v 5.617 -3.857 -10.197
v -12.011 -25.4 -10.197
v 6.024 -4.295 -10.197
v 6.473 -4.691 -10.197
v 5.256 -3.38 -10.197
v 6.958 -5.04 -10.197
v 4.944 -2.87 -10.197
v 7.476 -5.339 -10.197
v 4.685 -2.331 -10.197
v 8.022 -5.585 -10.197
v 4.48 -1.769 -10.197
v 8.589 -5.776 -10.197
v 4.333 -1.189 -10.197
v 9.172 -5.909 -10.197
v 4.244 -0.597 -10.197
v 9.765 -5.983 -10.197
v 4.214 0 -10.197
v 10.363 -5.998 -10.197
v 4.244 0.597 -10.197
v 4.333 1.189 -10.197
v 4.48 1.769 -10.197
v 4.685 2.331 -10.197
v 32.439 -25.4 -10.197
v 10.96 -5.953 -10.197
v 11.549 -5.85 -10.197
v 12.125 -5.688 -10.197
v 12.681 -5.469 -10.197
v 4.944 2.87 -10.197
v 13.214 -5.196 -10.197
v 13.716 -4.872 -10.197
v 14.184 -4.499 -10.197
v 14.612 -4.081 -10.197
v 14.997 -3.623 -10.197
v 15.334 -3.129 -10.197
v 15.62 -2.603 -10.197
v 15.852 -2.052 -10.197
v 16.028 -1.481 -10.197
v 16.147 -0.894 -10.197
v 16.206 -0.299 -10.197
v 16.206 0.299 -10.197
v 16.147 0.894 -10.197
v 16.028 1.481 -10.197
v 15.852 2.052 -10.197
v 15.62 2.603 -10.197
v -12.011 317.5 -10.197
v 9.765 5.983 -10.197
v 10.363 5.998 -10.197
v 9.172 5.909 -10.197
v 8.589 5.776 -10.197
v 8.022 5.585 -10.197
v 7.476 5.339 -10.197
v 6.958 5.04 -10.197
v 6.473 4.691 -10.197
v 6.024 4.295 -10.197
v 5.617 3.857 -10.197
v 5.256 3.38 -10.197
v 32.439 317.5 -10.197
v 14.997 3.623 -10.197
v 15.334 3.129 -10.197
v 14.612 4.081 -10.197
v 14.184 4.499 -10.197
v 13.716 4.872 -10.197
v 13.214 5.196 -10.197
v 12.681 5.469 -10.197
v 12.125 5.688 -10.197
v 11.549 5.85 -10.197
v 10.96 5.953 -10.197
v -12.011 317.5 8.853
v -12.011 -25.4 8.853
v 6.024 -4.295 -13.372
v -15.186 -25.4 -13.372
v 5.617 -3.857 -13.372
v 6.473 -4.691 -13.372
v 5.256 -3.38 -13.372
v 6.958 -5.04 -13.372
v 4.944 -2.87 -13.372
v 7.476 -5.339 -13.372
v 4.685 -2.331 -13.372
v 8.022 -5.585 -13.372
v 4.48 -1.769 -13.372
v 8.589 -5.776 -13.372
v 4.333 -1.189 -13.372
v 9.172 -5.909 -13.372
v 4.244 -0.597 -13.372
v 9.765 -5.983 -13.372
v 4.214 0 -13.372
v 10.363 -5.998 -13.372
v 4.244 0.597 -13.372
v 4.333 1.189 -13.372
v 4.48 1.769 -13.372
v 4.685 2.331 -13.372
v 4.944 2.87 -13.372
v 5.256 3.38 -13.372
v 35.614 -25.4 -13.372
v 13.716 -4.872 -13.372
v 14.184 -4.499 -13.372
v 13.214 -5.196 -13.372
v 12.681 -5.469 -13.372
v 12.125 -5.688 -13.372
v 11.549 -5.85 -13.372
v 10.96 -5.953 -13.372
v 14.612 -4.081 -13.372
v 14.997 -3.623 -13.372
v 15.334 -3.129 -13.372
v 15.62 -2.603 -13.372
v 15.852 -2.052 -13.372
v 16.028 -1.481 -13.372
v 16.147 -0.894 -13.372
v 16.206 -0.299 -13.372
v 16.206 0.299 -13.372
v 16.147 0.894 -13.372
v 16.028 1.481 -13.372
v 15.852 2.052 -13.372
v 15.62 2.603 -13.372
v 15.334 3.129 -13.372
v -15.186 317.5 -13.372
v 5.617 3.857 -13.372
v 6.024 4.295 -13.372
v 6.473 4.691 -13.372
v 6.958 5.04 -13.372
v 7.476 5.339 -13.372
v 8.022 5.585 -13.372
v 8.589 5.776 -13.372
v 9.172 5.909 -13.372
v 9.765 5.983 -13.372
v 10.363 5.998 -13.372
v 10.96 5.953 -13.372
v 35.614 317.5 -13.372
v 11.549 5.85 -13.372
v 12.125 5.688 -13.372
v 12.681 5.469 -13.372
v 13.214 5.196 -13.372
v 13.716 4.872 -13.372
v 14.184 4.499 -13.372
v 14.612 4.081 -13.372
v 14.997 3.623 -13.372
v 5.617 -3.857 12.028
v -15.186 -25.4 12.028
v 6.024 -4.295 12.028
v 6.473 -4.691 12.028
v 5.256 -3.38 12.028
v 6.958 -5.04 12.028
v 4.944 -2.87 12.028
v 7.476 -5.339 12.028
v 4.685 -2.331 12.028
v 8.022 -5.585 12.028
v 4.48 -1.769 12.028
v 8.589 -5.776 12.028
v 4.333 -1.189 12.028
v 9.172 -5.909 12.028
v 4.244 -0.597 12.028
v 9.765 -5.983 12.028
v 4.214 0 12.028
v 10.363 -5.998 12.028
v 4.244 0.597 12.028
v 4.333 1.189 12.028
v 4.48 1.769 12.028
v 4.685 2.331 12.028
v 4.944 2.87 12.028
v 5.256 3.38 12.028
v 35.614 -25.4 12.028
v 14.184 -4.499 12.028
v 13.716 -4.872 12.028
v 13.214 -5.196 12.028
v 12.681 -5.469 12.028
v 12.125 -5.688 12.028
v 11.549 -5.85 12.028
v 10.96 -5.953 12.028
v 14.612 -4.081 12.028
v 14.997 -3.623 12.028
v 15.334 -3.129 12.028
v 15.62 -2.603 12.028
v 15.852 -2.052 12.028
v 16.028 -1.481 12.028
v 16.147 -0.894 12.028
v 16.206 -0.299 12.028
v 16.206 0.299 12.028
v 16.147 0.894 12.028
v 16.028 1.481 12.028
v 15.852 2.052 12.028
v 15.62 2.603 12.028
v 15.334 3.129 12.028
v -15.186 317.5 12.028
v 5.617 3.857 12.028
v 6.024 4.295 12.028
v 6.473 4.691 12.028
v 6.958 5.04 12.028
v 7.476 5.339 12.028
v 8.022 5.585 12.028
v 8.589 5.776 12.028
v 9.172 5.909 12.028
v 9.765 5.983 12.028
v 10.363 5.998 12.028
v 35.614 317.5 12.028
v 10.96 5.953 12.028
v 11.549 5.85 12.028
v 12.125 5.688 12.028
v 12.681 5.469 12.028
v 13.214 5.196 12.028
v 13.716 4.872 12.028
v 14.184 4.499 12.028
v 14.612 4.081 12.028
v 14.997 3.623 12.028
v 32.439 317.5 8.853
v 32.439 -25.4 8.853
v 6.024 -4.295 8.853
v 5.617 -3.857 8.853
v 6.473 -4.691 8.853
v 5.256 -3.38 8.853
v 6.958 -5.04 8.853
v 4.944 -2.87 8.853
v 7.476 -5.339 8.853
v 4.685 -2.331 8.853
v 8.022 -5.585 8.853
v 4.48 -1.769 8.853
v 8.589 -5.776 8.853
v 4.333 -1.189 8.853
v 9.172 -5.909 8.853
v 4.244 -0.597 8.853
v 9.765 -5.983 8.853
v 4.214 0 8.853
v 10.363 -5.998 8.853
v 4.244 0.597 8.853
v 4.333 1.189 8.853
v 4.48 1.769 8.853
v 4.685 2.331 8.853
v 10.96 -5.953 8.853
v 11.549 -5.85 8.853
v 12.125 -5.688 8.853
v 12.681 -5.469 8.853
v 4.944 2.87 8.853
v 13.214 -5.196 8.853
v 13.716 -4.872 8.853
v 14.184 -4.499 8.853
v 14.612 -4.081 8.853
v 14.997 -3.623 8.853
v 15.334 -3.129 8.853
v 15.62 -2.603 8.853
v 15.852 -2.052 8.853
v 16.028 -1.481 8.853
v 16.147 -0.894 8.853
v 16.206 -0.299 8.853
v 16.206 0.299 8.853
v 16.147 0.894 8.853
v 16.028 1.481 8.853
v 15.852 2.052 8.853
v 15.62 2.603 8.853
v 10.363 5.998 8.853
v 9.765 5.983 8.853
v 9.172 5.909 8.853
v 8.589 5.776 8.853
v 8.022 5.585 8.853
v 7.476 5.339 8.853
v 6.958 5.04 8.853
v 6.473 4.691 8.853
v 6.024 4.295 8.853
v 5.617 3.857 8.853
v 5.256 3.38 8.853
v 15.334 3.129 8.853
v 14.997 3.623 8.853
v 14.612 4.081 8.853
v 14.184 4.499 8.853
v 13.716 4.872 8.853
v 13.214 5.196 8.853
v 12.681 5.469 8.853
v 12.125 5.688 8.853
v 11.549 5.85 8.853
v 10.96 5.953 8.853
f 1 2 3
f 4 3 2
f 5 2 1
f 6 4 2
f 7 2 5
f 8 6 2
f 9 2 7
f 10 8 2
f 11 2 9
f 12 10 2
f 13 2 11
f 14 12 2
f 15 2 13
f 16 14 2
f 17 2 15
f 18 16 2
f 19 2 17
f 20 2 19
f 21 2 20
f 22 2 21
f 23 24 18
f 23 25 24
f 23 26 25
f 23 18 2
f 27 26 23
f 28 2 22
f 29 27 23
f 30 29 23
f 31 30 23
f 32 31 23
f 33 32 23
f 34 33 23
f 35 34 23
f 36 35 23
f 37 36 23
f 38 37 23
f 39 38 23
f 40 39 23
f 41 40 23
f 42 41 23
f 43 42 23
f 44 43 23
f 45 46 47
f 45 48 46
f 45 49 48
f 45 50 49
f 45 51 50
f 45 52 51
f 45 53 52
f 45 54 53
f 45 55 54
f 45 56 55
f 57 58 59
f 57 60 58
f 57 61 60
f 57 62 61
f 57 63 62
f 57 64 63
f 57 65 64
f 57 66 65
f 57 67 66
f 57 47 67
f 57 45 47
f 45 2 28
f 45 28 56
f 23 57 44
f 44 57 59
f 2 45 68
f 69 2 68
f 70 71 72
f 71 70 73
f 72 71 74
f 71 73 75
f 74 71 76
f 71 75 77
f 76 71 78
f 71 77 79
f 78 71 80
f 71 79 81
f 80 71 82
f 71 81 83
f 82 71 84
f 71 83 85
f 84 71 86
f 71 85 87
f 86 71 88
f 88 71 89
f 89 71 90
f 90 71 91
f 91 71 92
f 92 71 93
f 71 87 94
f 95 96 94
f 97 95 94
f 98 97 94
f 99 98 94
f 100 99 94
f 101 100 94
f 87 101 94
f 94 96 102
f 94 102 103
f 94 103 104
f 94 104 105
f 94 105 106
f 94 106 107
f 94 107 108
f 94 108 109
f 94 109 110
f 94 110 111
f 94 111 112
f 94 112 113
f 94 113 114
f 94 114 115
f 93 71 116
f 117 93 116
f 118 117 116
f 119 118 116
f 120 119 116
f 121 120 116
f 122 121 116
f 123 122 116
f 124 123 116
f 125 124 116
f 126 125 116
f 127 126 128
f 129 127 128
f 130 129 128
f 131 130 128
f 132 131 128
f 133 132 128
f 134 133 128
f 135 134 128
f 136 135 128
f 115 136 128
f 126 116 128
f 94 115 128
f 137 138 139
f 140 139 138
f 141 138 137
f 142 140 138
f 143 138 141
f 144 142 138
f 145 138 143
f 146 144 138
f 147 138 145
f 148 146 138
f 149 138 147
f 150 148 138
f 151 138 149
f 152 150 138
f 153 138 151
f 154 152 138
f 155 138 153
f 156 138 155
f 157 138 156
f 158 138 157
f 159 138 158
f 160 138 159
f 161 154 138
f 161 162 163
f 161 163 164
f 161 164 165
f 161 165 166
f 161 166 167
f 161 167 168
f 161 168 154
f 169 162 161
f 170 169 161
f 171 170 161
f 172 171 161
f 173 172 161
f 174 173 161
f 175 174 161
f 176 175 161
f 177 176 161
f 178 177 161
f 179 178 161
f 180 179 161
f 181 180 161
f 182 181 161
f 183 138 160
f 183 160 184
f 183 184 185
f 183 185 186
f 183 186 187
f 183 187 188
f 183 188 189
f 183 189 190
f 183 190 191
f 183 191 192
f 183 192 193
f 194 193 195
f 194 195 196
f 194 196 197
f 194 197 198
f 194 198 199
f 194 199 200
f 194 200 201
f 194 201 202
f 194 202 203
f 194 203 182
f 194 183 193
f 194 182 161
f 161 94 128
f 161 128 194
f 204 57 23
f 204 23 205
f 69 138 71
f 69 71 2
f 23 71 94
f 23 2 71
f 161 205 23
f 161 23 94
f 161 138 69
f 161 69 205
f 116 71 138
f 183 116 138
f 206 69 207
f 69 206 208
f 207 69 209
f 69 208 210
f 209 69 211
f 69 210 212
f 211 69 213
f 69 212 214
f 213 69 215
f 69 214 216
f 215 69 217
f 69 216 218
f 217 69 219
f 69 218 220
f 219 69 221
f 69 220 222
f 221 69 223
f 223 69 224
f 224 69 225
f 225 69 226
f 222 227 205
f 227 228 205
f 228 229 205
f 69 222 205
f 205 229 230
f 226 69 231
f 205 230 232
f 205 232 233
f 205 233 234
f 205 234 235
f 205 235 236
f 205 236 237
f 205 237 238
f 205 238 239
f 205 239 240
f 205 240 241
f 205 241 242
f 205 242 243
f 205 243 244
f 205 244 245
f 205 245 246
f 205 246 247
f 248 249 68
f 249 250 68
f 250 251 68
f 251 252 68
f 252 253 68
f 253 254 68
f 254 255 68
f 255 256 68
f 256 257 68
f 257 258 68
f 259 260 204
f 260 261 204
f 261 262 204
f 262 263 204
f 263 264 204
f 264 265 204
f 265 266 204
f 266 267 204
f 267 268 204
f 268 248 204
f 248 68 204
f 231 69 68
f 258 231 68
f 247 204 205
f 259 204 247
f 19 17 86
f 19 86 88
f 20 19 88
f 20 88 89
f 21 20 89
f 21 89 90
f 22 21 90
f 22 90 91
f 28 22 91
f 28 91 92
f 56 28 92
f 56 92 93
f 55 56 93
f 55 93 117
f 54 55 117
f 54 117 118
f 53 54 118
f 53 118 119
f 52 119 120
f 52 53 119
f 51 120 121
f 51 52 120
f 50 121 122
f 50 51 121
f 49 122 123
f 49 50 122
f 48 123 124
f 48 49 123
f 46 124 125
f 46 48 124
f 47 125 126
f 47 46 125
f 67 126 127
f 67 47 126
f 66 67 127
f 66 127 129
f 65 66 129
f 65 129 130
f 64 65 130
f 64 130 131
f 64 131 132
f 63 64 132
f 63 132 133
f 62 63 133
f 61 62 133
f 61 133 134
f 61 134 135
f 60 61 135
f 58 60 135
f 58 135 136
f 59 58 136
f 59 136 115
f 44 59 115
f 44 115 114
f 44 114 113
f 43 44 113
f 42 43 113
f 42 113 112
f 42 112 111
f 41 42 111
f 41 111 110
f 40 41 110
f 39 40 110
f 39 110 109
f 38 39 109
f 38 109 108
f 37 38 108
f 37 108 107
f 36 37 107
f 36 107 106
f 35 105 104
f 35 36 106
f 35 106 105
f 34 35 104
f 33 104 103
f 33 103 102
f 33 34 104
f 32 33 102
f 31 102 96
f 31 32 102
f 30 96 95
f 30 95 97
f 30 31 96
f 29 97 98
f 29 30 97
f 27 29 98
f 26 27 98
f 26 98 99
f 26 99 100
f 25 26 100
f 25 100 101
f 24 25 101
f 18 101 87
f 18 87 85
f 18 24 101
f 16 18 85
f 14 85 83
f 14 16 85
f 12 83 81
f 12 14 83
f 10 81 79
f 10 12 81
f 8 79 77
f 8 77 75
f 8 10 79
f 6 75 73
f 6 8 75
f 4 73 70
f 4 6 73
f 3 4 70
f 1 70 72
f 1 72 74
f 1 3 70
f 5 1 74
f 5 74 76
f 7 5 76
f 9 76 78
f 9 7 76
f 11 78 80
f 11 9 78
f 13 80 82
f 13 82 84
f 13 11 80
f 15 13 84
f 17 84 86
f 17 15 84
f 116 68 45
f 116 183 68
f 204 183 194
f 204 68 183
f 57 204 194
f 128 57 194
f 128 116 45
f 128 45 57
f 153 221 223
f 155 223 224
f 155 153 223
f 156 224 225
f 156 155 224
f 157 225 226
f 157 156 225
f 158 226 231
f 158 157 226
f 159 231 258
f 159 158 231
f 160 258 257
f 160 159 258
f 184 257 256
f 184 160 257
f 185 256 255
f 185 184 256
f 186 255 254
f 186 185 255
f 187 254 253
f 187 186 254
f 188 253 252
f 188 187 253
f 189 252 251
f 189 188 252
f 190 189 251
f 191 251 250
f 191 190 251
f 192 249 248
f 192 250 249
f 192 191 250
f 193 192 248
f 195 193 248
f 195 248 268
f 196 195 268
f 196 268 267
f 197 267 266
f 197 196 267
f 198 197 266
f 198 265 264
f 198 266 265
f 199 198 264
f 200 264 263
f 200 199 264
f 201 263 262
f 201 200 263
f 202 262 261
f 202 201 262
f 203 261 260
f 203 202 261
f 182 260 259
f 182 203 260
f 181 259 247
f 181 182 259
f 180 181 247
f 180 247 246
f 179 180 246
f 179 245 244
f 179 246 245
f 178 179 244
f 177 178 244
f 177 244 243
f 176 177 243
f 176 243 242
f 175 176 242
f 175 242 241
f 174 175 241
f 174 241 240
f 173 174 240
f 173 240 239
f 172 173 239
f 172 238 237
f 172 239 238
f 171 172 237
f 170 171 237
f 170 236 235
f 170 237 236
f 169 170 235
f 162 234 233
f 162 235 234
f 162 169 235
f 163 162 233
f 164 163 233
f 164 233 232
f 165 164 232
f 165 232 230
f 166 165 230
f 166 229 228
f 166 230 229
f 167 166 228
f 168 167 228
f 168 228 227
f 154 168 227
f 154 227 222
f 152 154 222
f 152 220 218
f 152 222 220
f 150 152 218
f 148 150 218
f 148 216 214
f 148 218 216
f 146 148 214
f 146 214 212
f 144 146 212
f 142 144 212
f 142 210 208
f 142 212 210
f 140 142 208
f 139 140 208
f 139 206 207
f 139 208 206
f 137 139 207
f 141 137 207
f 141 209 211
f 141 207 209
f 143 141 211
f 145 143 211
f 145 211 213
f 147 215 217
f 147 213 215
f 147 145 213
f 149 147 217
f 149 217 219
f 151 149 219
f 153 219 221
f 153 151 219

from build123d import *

# Parameters (mm, degrees)
SKETCH2_W            = 50.8
SKETCH2_H            = 25.4
SKETCH2_W_2          = 44.45
SKETCH2_H_2          = 19.05
EXTRUDE_THIN1_DEPTH  = 355.6
SKETCH25_W           = 50.8
SKETCH25_H           = 25.4
SKETCH25_W_2         = 44.45
SKETCH25_H_2         = 19.05
BOSS_EXTRUDE14_DEPTH = 25.4
CUT_EXTRUDE9_START   = -25.4
SKETCH28_R           = 6
CUT_EXTRUDE9_DEPTH   = 25.4
SKETCH30_W           = 50.8
SKETCH30_H           = 25.4
CUT_EXTRUDE11_DEPTH  = 38.1


with BuildPart() as part:
    # Sketch2 → Extrude-Thin1 (new body)
    with BuildSketch(Plane(origin=(0, 0, 0), x_dir=(1, 0, 0), z_dir=(0, 1, 0))):
        with Locations((10.213756614, 0.671957672)):
            Rectangle(SKETCH2_W, SKETCH2_H)
        with Locations((10.213756614, 0.671957672)):
            Rectangle(SKETCH2_W_2, SKETCH2_H_2, mode=Mode.SUBTRACT)
    extrude(amount=EXTRUDE_THIN1_DEPTH)

    # Sketch25 → Boss-Extrude14 (add)
    with BuildSketch(Plane.XZ):
        with Locations((10.213756614, -0.671957672)):
            Rectangle(SKETCH25_W, SKETCH25_H)
        with Locations((10.213756614, -0.671957672)):
            Rectangle(SKETCH25_W_2, SKETCH25_H_2, mode=Mode.SUBTRACT)
    extrude(amount=BOSS_EXTRUDE14_DEPTH)

    # Sketch28 → Cut-Extrude9 (cut)
    with BuildSketch(Plane(origin=(0, 0, -13.371957672), x_dir=(-1, 0, 0), z_dir=(0, 0, -1)).offset(CUT_EXTRUDE9_START)):
        with Locations((-10.213756614, 0)):
            Circle(SKETCH28_R)
    extrude(amount=CUT_EXTRUDE9_DEPTH, mode=Mode.SUBTRACT)

    # Sketch30 → Cut-Extrude11 (cut)
    with BuildSketch(Plane(origin=(0, 355.6, 0), x_dir=(1, 0, 0), z_dir=(0, 1, 0))):
        with Locations((10.213756614, 0.671957672)):
            Rectangle(SKETCH30_W, SKETCH30_H)
    extrude(amount=-CUT_EXTRUDE11_DEPTH, mode=Mode.SUBTRACT)


solid = part.part
